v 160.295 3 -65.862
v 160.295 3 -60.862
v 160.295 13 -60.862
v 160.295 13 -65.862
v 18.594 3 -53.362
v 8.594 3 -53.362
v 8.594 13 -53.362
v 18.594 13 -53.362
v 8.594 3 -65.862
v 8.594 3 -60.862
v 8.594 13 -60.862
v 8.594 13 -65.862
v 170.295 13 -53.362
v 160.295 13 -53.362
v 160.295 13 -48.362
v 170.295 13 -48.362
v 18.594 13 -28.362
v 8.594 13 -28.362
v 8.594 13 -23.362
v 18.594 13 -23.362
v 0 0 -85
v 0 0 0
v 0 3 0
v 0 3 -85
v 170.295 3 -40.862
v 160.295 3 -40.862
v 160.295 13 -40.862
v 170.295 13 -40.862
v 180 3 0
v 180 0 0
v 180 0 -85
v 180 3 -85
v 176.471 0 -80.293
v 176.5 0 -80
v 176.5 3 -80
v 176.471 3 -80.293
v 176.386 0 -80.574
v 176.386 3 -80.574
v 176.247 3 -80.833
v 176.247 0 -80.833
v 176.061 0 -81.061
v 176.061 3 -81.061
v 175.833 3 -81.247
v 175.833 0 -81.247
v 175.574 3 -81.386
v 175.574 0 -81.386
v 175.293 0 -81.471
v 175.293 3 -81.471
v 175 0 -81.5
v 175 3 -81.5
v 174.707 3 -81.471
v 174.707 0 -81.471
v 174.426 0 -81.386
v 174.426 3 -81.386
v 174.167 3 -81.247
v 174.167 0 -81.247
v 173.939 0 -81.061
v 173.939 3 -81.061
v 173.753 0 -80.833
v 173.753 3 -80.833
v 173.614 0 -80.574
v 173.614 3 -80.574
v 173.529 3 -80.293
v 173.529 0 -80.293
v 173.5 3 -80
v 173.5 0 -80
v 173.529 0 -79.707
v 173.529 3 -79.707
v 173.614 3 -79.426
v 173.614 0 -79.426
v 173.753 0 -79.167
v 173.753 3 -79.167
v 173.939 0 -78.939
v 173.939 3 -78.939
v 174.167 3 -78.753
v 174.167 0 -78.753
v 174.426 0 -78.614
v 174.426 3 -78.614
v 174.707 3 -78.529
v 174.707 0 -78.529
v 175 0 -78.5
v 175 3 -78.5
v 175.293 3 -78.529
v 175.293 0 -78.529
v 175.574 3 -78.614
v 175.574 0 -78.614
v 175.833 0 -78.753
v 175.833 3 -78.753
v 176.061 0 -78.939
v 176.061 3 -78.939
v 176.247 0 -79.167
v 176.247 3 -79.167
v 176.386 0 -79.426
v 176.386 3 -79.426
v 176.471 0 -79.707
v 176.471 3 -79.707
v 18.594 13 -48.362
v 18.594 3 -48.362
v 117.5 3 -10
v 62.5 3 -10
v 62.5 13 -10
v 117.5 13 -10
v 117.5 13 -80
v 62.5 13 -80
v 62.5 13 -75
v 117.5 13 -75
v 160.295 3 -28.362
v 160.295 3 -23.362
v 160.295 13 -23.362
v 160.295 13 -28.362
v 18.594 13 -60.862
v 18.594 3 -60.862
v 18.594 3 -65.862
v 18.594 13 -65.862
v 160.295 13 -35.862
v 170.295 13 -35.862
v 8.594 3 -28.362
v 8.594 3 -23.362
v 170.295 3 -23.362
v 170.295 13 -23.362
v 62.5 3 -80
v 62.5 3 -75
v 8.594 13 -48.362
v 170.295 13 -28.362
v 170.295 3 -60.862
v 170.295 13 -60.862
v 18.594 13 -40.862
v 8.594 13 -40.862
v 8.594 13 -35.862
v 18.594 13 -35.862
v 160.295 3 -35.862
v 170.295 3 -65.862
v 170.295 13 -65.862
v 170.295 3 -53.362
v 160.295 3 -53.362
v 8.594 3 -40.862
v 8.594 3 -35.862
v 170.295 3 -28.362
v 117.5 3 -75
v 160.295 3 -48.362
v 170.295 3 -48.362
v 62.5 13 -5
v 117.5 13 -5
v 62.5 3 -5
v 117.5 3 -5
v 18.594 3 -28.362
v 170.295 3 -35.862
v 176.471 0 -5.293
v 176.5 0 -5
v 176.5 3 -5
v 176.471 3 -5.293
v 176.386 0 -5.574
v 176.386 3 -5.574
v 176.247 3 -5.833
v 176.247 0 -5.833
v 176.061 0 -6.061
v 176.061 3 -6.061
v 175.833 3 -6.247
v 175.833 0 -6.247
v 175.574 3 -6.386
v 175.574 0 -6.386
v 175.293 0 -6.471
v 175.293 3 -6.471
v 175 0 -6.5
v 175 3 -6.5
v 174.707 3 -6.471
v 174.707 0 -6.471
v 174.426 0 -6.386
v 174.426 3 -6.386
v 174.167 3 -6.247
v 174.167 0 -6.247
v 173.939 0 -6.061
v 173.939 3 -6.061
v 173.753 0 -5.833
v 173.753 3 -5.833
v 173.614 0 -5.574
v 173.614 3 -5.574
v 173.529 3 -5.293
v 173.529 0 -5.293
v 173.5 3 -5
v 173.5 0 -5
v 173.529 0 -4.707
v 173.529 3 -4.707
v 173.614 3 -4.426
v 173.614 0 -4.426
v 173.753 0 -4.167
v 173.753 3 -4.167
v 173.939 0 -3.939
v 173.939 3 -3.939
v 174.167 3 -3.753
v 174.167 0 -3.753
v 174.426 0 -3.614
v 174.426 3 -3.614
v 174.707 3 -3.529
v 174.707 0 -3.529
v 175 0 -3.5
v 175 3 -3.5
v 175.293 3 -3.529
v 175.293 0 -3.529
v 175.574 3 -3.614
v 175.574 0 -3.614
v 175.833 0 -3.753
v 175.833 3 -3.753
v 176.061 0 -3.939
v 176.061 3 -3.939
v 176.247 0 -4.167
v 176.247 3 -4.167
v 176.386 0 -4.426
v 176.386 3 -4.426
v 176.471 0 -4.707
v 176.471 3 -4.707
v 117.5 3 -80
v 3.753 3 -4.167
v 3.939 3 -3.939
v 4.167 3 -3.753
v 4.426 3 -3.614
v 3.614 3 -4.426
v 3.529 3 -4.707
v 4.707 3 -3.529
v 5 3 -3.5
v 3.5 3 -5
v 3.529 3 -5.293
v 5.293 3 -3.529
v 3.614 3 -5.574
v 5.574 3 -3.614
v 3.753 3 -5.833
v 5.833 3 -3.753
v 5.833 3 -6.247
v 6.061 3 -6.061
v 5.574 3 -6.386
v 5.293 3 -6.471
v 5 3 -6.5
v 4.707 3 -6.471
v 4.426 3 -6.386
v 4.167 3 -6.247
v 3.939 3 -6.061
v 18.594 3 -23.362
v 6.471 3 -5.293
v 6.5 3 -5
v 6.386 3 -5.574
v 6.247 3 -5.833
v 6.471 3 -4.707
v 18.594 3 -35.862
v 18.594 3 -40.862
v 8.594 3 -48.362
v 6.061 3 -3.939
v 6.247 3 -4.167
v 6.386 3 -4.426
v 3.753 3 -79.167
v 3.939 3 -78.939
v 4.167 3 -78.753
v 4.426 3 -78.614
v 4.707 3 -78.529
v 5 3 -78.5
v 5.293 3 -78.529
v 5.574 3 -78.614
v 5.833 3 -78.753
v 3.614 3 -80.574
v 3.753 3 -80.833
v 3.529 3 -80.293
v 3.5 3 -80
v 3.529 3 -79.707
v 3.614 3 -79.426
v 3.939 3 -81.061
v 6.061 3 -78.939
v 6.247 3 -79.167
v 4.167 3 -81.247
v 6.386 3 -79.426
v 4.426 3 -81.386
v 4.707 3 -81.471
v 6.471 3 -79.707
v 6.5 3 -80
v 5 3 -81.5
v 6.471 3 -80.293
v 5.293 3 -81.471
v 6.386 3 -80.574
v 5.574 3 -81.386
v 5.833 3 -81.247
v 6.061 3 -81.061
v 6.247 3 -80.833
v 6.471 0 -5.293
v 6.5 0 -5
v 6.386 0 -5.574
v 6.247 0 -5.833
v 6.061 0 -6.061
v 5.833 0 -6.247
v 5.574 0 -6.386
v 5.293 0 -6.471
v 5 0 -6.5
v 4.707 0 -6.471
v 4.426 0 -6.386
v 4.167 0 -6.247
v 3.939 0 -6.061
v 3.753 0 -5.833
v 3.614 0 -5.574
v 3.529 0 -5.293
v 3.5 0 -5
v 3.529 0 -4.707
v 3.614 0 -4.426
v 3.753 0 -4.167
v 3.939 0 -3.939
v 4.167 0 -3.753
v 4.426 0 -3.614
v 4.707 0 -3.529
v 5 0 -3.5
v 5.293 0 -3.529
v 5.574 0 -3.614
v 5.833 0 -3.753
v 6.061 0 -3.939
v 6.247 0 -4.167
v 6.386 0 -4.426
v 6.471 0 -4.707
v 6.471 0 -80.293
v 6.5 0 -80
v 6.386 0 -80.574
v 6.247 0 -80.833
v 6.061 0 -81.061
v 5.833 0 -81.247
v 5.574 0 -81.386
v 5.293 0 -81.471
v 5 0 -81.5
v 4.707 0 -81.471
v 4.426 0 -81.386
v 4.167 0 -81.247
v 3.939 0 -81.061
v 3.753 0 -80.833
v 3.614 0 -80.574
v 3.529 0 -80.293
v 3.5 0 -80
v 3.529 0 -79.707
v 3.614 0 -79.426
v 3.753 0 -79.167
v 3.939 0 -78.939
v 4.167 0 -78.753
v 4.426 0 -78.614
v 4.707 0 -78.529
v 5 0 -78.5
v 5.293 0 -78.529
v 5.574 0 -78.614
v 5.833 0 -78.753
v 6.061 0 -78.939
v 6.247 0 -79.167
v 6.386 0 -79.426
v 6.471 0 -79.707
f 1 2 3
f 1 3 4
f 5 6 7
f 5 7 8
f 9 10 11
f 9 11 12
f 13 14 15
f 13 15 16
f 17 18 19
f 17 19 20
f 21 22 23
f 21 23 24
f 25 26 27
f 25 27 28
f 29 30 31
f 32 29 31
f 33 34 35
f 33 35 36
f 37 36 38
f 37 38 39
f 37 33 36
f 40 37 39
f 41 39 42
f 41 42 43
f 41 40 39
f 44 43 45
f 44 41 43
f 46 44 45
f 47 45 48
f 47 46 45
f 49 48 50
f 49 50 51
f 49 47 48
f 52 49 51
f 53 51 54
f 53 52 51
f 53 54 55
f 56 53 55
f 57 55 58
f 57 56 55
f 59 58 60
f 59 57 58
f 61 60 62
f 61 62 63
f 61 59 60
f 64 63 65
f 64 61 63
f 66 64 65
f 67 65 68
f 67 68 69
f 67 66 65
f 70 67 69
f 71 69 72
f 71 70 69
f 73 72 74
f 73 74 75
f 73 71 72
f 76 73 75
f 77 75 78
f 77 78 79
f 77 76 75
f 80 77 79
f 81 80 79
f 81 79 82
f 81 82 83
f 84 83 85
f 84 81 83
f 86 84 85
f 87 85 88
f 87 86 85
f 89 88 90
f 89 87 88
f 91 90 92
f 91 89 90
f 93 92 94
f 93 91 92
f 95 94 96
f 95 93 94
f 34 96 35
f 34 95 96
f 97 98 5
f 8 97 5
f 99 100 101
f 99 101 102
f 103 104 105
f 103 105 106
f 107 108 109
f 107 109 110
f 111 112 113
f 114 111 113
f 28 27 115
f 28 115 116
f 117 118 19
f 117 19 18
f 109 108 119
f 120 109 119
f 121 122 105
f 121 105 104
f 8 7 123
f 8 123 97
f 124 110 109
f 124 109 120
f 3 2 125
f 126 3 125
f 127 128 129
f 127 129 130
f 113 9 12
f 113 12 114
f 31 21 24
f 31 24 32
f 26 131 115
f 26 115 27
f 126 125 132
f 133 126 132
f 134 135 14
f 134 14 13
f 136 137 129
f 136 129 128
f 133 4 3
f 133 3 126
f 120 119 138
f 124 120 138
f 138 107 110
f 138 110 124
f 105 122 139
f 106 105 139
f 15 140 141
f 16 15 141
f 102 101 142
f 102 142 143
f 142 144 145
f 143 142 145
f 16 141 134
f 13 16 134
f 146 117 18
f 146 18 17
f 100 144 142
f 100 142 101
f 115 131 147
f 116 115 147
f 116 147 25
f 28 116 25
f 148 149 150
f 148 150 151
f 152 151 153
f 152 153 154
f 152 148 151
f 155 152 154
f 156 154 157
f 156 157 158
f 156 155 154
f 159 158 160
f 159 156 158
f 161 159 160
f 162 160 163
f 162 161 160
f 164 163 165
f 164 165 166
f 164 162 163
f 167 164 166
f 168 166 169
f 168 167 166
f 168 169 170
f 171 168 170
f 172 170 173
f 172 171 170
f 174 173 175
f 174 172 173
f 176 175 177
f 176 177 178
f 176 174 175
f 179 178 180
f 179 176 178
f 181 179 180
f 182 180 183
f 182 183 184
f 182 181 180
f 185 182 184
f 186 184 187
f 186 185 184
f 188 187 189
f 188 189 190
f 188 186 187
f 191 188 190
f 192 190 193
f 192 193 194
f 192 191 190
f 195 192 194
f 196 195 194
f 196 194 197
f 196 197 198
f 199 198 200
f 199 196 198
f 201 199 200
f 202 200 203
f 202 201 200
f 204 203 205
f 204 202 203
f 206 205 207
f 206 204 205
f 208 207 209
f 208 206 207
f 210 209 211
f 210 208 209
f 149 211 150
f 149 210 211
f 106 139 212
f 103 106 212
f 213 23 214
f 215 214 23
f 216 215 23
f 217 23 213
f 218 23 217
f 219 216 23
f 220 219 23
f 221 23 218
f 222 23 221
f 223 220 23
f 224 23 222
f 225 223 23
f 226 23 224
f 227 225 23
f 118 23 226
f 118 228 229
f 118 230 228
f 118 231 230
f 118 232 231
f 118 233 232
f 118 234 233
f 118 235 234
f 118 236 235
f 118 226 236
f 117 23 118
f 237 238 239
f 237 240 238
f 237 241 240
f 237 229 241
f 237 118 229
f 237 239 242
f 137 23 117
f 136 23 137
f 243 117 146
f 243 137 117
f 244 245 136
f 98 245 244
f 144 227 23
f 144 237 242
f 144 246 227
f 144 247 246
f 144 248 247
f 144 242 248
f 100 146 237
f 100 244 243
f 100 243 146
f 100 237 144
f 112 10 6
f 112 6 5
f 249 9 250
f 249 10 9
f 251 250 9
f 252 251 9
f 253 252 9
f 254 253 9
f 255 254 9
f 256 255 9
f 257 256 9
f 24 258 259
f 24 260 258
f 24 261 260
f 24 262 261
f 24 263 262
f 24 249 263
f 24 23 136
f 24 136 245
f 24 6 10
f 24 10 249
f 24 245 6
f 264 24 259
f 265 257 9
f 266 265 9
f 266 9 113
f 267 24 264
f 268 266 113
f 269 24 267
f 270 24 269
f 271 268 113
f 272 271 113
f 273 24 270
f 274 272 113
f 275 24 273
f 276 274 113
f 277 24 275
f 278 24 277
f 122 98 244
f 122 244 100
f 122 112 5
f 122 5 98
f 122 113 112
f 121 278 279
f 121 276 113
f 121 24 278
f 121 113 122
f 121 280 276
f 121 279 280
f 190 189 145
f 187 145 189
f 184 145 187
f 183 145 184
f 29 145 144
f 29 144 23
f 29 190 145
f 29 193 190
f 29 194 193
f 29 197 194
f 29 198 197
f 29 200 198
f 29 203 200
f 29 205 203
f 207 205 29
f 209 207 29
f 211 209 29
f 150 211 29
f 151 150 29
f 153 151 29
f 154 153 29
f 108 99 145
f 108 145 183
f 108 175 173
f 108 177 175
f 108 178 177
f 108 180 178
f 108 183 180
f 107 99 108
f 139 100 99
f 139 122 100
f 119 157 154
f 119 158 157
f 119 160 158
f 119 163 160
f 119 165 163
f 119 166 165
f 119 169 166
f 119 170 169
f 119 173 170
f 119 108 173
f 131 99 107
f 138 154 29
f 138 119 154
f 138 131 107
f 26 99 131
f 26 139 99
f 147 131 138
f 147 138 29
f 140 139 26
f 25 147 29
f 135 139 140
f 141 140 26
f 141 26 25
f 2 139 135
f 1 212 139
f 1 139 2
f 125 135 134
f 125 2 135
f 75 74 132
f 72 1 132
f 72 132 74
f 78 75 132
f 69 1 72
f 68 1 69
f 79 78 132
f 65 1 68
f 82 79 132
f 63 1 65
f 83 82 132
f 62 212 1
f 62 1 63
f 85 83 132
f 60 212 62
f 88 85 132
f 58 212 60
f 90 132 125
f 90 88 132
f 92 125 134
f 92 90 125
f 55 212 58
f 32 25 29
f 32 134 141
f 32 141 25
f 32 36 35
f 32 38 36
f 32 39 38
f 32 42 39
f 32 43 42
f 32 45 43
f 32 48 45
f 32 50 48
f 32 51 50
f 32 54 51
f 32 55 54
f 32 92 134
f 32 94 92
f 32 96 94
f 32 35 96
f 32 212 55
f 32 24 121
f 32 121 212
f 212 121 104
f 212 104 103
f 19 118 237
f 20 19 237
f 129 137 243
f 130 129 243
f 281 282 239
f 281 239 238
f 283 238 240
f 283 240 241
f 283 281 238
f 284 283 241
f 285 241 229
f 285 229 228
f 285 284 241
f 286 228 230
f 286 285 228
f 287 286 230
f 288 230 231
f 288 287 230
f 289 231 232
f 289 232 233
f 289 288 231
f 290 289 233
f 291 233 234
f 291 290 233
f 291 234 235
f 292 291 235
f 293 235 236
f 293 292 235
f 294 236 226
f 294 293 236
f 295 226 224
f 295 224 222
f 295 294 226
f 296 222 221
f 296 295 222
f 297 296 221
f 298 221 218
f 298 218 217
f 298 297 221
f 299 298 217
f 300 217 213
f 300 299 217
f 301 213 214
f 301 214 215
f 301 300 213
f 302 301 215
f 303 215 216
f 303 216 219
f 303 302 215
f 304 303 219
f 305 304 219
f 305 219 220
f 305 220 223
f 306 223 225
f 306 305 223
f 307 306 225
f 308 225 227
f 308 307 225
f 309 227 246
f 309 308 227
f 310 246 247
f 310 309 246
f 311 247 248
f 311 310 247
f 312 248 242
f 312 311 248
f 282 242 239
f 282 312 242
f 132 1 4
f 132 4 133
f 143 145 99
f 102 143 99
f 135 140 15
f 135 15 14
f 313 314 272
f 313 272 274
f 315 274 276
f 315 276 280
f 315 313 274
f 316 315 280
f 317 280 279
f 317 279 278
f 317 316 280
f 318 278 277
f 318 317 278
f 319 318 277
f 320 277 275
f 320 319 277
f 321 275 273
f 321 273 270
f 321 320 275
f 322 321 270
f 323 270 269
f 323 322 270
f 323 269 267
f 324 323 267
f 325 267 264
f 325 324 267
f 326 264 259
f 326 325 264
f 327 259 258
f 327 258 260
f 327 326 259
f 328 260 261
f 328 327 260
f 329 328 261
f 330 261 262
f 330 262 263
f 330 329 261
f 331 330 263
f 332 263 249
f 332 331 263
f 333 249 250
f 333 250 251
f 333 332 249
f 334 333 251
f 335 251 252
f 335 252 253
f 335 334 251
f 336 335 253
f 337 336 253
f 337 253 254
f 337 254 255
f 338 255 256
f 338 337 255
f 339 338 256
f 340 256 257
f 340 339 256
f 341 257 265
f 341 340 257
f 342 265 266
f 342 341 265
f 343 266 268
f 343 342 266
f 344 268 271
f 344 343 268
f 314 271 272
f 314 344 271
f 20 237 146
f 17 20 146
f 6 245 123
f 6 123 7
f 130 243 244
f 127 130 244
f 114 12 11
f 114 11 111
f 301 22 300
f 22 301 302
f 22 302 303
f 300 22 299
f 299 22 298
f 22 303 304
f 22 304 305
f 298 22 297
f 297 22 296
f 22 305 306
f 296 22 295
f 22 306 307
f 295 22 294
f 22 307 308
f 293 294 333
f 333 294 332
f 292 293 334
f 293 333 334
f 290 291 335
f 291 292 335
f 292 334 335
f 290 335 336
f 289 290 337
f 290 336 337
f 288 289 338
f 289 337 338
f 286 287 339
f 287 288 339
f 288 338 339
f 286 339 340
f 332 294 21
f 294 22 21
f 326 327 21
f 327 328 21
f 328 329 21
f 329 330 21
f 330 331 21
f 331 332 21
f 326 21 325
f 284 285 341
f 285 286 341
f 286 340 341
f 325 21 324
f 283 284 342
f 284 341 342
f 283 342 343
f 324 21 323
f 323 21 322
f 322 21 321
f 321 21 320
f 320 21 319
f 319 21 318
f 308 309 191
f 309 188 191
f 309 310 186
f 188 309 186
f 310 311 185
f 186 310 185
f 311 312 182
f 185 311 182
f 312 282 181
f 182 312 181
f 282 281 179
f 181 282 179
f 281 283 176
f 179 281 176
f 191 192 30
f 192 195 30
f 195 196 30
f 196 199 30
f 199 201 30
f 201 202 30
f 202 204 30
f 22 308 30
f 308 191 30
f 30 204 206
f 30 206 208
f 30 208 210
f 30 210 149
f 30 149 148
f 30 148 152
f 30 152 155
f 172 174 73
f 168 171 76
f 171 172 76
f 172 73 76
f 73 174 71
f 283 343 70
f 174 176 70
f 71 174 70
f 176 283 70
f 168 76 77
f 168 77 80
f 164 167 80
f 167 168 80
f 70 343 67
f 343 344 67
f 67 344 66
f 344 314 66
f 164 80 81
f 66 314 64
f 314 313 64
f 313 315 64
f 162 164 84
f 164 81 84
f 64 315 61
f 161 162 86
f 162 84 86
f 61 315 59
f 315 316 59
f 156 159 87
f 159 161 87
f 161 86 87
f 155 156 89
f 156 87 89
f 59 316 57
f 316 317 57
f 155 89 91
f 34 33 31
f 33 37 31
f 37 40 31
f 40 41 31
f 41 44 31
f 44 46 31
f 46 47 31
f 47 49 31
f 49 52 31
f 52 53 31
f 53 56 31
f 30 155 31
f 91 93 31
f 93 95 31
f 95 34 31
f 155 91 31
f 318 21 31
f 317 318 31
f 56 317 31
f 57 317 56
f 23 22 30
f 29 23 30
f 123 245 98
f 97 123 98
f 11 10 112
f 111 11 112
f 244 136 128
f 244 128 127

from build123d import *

# Parameters (mm, degrees)
ESQUISSE1_W      = 180
ESQUISSE1_H      = 85
ESQUISSE1_R      = 1.5
EXTRUSION1_DEPTH = 3
ESQUISSE2_W      = 55
ESQUISSE2_H      = 5
EXTRUSION2_DEPTH = 10
ESQUISSE4_W      = 10
ESQUISSE4_H      = 5
EXTRUSION4_DEPTH = 10


with BuildPart() as part:
    # Esquisse1 → Extrusion1 (new body)
    with BuildSketch(Plane(origin=(0, 0, 0), x_dir=(1, 0, 0), z_dir=(0, 1, 0))):
        with Locations((90, 42.5)):
            Rectangle(ESQUISSE1_W, ESQUISSE1_H)
        with Locations((5, 80)):
            Circle(ESQUISSE1_R, mode=Mode.SUBTRACT)
        with Locations((175, 80)):
            Circle(ESQUISSE1_R, mode=Mode.SUBTRACT)
        with Locations((175, 5)):
            Circle(ESQUISSE1_R, mode=Mode.SUBTRACT)
        with Locations((5, 5)):
            Circle(ESQUISSE1_R, mode=Mode.SUBTRACT)
    extrude(amount=EXTRUSION1_DEPTH)

    # Esquisse2 → Extrusion2 (add)
    with BuildSketch(Plane(origin=(0, 3, 0), x_dir=(1, 0, 0), z_dir=(0, 1, 0))):
        with Locations((90, 77.5)):
            Rectangle(ESQUISSE2_W, ESQUISSE2_H)
        with Locations((90, 7.5)):
            Rectangle(ESQUISSE2_W, ESQUISSE2_H)
    extrude(amount=EXTRUSION2_DEPTH)

    # Esquisse4 → Extrusion4 (add)
    with BuildSketch(Plane(origin=(0, 3, 0), x_dir=(1, 0, 0), z_dir=(0, 1, 0))):
        with Locations((165.295070297, 63.362289653)):
            Rectangle(ESQUISSE4_W, ESQUISSE4_H)
        with Locations((13.593769781, 63.362289653)):
            Rectangle(ESQUISSE4_W, ESQUISSE4_H)
        with Locations((13.593769781, 38.362289653)):
            Rectangle(ESQUISSE4_W, ESQUISSE4_H)
        with Locations((13.593769781, 25.862289653)):
            Rectangle(ESQUISSE4_W, ESQUISSE4_H)
        with Locations((13.593769781, 50.862289653)):
            Rectangle(ESQUISSE4_W, ESQUISSE4_H)
        with Locations((165.295070297, 38.362289653)):
            Rectangle(ESQUISSE4_W, ESQUISSE4_H)
        with Locations((165.295070297, 25.862289653)):
            Rectangle(ESQUISSE4_W, ESQUISSE4_H)
        with Locations((165.295070297, 50.862289653)):
            Rectangle(ESQUISSE4_W, ESQUISSE4_H)
    extrude(amount=EXTRUSION4_DEPTH)


solid = part.part
